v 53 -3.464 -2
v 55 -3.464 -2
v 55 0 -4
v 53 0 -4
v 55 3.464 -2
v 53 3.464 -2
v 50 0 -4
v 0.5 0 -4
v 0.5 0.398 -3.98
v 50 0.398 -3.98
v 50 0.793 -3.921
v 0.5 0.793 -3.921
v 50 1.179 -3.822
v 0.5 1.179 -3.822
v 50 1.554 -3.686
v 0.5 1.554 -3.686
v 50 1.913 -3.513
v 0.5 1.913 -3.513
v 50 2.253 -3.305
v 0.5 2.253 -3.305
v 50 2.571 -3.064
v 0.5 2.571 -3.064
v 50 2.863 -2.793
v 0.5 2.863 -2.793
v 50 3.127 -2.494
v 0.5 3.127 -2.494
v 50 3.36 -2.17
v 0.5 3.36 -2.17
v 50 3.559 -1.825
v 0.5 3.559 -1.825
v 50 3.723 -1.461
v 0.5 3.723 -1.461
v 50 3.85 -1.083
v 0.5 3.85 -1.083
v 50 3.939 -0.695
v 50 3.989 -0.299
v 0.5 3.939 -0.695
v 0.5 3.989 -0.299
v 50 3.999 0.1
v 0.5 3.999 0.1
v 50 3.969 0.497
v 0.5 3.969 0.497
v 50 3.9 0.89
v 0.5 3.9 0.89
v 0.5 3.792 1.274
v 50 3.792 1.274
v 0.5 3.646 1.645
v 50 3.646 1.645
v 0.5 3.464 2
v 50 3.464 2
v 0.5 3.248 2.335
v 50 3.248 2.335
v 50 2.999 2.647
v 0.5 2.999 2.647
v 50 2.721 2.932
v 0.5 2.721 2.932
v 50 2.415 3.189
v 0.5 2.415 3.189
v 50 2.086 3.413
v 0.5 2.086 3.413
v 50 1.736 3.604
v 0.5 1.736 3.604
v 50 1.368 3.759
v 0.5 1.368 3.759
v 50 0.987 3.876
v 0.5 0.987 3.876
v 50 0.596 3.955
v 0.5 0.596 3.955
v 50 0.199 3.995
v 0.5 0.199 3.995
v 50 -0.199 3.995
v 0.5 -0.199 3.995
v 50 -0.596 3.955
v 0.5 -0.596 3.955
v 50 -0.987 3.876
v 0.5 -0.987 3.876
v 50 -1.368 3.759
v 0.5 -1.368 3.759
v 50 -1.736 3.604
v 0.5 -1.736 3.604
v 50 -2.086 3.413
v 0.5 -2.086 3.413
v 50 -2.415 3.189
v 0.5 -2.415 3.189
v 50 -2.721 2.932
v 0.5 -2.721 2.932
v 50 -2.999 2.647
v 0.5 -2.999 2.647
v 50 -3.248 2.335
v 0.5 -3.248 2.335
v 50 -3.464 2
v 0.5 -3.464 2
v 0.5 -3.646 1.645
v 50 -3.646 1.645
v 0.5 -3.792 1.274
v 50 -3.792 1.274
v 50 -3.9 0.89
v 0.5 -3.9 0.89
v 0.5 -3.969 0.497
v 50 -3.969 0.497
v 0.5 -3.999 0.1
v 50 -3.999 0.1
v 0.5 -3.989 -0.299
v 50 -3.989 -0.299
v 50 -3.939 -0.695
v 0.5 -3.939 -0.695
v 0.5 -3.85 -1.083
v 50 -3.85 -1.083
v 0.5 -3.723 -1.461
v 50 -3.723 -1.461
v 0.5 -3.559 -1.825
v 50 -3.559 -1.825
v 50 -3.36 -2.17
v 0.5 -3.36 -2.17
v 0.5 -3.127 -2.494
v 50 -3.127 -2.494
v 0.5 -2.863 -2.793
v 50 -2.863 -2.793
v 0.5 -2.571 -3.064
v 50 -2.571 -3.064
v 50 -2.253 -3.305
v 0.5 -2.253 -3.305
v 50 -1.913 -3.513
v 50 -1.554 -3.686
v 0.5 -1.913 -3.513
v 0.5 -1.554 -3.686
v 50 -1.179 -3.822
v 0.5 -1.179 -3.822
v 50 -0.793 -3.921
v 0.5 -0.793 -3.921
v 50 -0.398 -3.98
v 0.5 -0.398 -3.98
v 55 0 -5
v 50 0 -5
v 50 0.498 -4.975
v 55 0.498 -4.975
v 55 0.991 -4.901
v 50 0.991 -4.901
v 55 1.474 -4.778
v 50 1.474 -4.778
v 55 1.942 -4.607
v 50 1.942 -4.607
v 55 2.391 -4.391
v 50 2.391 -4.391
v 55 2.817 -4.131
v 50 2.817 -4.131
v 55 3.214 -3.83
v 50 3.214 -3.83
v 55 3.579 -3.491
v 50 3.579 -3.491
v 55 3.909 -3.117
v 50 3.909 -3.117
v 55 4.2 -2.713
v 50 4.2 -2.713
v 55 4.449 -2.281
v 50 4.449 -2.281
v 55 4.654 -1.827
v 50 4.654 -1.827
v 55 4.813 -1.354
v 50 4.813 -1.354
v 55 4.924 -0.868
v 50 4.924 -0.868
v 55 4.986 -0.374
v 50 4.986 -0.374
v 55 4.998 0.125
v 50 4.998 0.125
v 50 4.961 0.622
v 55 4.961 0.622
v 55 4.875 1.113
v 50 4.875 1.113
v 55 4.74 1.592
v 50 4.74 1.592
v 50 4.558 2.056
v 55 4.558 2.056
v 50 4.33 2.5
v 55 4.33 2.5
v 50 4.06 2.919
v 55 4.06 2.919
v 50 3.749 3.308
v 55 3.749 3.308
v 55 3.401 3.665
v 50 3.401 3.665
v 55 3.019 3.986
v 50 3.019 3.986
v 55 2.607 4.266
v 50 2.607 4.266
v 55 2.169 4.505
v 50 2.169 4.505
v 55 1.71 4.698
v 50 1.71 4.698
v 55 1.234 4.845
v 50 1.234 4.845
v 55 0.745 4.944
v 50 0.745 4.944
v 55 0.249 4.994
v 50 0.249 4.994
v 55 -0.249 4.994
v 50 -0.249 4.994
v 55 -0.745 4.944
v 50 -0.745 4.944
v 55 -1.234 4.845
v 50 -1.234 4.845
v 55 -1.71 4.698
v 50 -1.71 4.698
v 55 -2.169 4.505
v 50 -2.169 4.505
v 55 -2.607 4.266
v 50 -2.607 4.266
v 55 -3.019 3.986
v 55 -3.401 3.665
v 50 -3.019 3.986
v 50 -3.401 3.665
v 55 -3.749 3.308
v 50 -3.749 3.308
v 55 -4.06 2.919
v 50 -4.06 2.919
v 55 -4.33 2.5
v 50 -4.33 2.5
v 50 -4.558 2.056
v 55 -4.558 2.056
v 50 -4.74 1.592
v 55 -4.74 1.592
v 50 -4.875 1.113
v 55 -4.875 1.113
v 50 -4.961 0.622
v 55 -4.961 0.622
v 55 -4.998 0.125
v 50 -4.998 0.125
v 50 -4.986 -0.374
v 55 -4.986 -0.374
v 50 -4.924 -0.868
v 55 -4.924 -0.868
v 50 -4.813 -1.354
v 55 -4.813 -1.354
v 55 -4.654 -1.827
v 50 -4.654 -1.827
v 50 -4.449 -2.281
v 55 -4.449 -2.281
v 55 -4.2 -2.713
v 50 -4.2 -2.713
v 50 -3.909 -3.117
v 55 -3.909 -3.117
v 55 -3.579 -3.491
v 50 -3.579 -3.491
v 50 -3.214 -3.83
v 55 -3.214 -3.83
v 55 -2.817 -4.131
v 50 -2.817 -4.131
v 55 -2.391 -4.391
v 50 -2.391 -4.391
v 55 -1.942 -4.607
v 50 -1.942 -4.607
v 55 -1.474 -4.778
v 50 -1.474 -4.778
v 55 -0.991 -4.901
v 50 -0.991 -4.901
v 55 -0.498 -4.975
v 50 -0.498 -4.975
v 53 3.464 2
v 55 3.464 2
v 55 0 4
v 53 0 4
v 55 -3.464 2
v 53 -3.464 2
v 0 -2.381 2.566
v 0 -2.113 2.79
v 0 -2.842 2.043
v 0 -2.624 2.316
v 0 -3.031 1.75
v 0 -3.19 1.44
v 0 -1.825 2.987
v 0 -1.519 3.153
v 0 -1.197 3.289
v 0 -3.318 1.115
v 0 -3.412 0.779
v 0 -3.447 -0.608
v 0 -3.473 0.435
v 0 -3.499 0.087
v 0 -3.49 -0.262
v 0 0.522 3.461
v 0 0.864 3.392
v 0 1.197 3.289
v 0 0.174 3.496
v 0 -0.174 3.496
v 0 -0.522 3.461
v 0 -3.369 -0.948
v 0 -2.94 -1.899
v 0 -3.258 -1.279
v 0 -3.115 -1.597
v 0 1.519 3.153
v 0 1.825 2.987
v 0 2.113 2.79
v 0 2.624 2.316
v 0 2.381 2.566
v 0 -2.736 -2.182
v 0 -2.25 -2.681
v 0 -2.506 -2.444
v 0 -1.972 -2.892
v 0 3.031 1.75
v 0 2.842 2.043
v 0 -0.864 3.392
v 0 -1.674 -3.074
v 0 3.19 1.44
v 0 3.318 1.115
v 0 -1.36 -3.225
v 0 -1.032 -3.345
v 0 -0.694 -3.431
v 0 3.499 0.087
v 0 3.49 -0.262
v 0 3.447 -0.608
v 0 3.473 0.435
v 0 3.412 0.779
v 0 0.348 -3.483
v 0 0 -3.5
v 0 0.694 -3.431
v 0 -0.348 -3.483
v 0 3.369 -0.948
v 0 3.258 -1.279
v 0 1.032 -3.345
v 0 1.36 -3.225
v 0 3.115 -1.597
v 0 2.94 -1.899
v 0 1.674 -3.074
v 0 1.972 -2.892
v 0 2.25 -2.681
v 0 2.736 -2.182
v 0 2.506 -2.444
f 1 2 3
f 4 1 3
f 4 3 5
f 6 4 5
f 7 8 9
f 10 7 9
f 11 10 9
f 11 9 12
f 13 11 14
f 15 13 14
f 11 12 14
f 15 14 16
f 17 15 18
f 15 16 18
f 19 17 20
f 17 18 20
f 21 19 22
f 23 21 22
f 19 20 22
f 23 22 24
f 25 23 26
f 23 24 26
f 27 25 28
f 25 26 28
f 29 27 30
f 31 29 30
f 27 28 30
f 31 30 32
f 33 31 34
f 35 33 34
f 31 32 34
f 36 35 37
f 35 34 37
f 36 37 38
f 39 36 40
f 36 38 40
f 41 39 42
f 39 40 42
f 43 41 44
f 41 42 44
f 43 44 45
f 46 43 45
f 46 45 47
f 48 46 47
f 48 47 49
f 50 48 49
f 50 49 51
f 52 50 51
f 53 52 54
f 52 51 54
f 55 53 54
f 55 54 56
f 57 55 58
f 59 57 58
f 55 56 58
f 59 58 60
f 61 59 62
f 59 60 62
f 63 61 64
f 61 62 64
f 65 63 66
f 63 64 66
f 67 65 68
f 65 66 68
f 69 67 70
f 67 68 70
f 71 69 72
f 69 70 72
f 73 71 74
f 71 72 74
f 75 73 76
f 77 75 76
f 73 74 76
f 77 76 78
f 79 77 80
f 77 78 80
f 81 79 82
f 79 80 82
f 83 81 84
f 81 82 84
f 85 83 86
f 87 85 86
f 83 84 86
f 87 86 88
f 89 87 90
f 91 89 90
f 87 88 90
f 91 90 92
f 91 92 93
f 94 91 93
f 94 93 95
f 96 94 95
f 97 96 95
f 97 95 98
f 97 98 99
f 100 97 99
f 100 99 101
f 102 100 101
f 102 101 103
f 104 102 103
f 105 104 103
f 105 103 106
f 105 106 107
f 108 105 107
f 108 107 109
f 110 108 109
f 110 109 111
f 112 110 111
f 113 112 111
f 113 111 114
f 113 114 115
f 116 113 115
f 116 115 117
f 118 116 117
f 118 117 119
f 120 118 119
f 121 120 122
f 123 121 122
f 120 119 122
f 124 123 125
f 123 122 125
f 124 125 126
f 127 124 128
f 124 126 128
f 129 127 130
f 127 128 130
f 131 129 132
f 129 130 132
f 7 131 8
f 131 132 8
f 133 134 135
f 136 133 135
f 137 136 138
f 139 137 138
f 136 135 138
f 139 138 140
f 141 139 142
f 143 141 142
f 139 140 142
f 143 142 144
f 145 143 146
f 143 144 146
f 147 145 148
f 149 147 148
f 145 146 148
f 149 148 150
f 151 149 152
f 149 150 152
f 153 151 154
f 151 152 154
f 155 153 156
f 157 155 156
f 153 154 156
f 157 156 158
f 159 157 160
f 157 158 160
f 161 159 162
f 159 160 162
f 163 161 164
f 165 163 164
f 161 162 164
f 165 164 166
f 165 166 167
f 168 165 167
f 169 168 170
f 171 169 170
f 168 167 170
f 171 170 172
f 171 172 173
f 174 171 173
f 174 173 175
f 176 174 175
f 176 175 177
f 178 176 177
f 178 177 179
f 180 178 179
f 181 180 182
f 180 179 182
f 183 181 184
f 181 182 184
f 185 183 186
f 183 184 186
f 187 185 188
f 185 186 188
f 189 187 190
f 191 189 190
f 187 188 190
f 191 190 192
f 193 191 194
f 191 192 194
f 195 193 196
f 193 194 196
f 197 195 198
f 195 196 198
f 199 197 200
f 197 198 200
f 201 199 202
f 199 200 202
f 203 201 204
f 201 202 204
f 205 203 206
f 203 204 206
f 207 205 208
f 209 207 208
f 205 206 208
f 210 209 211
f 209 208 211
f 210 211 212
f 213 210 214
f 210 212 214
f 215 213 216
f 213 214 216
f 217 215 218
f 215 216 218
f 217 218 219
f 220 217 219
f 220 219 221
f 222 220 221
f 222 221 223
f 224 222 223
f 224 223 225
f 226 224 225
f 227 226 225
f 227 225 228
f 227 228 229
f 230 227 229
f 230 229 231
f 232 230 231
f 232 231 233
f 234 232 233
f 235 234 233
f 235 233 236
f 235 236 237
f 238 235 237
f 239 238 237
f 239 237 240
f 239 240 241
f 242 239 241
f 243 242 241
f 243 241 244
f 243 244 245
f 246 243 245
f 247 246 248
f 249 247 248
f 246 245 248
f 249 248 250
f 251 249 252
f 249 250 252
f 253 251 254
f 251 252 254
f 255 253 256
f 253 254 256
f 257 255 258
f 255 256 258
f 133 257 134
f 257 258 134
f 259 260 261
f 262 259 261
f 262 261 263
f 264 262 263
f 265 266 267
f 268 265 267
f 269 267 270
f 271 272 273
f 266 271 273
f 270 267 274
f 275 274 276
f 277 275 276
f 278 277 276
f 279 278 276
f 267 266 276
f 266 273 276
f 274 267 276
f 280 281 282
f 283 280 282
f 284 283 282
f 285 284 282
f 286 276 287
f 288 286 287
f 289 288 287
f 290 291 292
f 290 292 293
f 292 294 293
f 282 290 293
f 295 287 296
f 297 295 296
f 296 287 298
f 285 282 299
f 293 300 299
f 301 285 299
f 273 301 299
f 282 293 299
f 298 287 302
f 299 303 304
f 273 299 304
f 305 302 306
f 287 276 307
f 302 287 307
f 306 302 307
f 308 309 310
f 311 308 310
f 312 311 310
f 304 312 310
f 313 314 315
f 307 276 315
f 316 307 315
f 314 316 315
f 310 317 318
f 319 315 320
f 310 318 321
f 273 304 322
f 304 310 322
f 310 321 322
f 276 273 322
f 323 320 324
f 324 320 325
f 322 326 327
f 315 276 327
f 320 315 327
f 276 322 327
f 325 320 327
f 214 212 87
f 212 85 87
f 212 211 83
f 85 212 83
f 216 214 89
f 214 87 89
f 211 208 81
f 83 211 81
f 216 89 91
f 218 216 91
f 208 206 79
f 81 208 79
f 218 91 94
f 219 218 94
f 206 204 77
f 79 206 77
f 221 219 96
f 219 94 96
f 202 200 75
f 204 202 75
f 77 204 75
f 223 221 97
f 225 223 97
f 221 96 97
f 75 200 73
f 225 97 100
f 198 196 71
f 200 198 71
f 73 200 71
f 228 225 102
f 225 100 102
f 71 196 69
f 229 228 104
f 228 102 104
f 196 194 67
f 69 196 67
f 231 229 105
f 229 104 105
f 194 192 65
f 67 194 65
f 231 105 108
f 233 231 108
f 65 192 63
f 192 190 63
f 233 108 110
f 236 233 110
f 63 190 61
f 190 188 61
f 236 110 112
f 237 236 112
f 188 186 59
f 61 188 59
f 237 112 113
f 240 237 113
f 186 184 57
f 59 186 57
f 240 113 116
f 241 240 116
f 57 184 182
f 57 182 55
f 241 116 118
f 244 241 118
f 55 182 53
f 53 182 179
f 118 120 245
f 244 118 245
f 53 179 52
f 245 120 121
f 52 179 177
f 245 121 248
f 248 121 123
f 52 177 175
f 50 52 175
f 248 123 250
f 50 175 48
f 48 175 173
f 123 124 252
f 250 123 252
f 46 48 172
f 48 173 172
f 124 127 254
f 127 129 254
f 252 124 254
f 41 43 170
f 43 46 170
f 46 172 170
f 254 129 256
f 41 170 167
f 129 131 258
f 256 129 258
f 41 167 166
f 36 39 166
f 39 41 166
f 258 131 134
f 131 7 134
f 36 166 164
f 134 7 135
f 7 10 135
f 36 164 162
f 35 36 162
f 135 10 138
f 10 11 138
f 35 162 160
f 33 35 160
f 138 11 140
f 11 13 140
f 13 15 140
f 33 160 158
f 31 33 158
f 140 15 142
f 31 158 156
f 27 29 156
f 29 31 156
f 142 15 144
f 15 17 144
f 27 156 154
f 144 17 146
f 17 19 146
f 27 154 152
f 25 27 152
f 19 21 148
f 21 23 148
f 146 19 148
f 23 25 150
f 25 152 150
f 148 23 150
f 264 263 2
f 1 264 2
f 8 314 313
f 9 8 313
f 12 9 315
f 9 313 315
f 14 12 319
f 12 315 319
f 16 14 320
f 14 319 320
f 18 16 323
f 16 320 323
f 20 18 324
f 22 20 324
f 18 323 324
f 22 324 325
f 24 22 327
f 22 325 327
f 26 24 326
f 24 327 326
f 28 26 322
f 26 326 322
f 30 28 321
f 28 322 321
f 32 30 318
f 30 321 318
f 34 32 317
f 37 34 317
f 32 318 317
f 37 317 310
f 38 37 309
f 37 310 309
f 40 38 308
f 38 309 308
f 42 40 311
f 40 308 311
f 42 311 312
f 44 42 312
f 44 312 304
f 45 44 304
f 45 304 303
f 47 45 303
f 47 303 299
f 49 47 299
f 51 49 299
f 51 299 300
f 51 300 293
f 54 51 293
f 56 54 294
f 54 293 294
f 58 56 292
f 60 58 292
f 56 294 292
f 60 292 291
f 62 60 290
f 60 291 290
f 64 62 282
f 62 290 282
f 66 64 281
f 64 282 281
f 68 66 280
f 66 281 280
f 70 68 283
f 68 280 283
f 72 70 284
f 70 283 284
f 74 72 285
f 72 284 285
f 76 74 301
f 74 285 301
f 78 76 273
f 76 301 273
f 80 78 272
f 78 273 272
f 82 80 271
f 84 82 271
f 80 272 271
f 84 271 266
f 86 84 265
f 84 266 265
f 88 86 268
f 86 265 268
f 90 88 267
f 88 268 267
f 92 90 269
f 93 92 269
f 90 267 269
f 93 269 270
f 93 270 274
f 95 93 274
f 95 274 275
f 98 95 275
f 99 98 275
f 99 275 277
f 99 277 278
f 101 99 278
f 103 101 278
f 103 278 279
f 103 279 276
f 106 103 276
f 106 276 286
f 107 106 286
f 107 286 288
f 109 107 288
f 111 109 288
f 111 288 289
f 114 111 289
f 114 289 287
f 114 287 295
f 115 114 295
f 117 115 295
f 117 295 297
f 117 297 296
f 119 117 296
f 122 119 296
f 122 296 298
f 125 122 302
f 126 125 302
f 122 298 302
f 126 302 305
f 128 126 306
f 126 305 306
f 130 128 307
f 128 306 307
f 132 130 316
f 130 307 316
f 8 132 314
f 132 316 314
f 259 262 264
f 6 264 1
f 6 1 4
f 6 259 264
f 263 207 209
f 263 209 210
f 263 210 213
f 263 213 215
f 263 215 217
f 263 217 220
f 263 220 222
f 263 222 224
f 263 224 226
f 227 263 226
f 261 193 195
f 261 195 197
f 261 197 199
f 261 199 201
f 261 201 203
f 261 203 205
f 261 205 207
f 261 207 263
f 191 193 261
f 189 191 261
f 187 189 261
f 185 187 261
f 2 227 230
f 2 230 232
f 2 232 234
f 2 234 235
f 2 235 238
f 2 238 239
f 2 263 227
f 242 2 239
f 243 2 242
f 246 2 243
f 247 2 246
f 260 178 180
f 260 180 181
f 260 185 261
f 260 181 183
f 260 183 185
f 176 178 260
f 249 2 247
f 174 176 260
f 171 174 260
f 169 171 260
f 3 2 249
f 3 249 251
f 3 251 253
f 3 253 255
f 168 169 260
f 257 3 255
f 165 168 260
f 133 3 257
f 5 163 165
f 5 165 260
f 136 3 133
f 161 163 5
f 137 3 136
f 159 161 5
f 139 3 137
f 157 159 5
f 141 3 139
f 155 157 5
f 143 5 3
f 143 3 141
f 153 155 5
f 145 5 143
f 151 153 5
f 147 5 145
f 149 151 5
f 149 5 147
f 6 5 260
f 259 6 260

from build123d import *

# Parameters (mm, degrees)
CROQUIS1_R              = 4
SALIENTE_EXTRUIR1_DEPTH = 50
CROQUIS2_R              = 5
SALIENTE_EXTRUIR2_DEPTH = 5
CORTAR_EXTRUIR1_DEPTH   = 2
CHAFL_N1_SIZE           = 0.5


with BuildPart() as part:
    # Croquis1 → Saliente-Extruir1 (new body)
    with BuildSketch(Plane(origin=(0, 0, 0), x_dir=(0, 0, -1), z_dir=(1, 0, 0))):
        Circle(CROQUIS1_R)
    extrude(amount=SALIENTE_EXTRUIR1_DEPTH)

    # Croquis2 → Saliente-Extruir2 (add)
    with BuildSketch(Plane(origin=(50, 0, 0), x_dir=(0, 0, -1), z_dir=(1, 0, 0))):
        Circle(CROQUIS2_R)
    extrude(amount=SALIENTE_EXTRUIR2_DEPTH)

    # Croquis3 → Cortar-Extruir1 (cut)
    with BuildSketch(Plane(origin=(55, 0, 0), x_dir=(0, 0, -1), z_dir=(1, 0, 0))):
        Polygon((4, 0), (2, 3.464101615), (-2, 3.464101615), (-4, 0), (-2, -3.464101615), (2, -3.464101615), align=None)
    extrude(amount=-CORTAR_EXTRUIR1_DEPTH, mode=Mode.SUBTRACT)

    # Chaflán1
    chafl_n1_edges = [part.edges().sort_by_distance(p)[0] for p in [
        (0, 0, 4),
    ]]
    chamfer(chafl_n1_edges, length=CHAFL_N1_SIZE)


solid = part.part
